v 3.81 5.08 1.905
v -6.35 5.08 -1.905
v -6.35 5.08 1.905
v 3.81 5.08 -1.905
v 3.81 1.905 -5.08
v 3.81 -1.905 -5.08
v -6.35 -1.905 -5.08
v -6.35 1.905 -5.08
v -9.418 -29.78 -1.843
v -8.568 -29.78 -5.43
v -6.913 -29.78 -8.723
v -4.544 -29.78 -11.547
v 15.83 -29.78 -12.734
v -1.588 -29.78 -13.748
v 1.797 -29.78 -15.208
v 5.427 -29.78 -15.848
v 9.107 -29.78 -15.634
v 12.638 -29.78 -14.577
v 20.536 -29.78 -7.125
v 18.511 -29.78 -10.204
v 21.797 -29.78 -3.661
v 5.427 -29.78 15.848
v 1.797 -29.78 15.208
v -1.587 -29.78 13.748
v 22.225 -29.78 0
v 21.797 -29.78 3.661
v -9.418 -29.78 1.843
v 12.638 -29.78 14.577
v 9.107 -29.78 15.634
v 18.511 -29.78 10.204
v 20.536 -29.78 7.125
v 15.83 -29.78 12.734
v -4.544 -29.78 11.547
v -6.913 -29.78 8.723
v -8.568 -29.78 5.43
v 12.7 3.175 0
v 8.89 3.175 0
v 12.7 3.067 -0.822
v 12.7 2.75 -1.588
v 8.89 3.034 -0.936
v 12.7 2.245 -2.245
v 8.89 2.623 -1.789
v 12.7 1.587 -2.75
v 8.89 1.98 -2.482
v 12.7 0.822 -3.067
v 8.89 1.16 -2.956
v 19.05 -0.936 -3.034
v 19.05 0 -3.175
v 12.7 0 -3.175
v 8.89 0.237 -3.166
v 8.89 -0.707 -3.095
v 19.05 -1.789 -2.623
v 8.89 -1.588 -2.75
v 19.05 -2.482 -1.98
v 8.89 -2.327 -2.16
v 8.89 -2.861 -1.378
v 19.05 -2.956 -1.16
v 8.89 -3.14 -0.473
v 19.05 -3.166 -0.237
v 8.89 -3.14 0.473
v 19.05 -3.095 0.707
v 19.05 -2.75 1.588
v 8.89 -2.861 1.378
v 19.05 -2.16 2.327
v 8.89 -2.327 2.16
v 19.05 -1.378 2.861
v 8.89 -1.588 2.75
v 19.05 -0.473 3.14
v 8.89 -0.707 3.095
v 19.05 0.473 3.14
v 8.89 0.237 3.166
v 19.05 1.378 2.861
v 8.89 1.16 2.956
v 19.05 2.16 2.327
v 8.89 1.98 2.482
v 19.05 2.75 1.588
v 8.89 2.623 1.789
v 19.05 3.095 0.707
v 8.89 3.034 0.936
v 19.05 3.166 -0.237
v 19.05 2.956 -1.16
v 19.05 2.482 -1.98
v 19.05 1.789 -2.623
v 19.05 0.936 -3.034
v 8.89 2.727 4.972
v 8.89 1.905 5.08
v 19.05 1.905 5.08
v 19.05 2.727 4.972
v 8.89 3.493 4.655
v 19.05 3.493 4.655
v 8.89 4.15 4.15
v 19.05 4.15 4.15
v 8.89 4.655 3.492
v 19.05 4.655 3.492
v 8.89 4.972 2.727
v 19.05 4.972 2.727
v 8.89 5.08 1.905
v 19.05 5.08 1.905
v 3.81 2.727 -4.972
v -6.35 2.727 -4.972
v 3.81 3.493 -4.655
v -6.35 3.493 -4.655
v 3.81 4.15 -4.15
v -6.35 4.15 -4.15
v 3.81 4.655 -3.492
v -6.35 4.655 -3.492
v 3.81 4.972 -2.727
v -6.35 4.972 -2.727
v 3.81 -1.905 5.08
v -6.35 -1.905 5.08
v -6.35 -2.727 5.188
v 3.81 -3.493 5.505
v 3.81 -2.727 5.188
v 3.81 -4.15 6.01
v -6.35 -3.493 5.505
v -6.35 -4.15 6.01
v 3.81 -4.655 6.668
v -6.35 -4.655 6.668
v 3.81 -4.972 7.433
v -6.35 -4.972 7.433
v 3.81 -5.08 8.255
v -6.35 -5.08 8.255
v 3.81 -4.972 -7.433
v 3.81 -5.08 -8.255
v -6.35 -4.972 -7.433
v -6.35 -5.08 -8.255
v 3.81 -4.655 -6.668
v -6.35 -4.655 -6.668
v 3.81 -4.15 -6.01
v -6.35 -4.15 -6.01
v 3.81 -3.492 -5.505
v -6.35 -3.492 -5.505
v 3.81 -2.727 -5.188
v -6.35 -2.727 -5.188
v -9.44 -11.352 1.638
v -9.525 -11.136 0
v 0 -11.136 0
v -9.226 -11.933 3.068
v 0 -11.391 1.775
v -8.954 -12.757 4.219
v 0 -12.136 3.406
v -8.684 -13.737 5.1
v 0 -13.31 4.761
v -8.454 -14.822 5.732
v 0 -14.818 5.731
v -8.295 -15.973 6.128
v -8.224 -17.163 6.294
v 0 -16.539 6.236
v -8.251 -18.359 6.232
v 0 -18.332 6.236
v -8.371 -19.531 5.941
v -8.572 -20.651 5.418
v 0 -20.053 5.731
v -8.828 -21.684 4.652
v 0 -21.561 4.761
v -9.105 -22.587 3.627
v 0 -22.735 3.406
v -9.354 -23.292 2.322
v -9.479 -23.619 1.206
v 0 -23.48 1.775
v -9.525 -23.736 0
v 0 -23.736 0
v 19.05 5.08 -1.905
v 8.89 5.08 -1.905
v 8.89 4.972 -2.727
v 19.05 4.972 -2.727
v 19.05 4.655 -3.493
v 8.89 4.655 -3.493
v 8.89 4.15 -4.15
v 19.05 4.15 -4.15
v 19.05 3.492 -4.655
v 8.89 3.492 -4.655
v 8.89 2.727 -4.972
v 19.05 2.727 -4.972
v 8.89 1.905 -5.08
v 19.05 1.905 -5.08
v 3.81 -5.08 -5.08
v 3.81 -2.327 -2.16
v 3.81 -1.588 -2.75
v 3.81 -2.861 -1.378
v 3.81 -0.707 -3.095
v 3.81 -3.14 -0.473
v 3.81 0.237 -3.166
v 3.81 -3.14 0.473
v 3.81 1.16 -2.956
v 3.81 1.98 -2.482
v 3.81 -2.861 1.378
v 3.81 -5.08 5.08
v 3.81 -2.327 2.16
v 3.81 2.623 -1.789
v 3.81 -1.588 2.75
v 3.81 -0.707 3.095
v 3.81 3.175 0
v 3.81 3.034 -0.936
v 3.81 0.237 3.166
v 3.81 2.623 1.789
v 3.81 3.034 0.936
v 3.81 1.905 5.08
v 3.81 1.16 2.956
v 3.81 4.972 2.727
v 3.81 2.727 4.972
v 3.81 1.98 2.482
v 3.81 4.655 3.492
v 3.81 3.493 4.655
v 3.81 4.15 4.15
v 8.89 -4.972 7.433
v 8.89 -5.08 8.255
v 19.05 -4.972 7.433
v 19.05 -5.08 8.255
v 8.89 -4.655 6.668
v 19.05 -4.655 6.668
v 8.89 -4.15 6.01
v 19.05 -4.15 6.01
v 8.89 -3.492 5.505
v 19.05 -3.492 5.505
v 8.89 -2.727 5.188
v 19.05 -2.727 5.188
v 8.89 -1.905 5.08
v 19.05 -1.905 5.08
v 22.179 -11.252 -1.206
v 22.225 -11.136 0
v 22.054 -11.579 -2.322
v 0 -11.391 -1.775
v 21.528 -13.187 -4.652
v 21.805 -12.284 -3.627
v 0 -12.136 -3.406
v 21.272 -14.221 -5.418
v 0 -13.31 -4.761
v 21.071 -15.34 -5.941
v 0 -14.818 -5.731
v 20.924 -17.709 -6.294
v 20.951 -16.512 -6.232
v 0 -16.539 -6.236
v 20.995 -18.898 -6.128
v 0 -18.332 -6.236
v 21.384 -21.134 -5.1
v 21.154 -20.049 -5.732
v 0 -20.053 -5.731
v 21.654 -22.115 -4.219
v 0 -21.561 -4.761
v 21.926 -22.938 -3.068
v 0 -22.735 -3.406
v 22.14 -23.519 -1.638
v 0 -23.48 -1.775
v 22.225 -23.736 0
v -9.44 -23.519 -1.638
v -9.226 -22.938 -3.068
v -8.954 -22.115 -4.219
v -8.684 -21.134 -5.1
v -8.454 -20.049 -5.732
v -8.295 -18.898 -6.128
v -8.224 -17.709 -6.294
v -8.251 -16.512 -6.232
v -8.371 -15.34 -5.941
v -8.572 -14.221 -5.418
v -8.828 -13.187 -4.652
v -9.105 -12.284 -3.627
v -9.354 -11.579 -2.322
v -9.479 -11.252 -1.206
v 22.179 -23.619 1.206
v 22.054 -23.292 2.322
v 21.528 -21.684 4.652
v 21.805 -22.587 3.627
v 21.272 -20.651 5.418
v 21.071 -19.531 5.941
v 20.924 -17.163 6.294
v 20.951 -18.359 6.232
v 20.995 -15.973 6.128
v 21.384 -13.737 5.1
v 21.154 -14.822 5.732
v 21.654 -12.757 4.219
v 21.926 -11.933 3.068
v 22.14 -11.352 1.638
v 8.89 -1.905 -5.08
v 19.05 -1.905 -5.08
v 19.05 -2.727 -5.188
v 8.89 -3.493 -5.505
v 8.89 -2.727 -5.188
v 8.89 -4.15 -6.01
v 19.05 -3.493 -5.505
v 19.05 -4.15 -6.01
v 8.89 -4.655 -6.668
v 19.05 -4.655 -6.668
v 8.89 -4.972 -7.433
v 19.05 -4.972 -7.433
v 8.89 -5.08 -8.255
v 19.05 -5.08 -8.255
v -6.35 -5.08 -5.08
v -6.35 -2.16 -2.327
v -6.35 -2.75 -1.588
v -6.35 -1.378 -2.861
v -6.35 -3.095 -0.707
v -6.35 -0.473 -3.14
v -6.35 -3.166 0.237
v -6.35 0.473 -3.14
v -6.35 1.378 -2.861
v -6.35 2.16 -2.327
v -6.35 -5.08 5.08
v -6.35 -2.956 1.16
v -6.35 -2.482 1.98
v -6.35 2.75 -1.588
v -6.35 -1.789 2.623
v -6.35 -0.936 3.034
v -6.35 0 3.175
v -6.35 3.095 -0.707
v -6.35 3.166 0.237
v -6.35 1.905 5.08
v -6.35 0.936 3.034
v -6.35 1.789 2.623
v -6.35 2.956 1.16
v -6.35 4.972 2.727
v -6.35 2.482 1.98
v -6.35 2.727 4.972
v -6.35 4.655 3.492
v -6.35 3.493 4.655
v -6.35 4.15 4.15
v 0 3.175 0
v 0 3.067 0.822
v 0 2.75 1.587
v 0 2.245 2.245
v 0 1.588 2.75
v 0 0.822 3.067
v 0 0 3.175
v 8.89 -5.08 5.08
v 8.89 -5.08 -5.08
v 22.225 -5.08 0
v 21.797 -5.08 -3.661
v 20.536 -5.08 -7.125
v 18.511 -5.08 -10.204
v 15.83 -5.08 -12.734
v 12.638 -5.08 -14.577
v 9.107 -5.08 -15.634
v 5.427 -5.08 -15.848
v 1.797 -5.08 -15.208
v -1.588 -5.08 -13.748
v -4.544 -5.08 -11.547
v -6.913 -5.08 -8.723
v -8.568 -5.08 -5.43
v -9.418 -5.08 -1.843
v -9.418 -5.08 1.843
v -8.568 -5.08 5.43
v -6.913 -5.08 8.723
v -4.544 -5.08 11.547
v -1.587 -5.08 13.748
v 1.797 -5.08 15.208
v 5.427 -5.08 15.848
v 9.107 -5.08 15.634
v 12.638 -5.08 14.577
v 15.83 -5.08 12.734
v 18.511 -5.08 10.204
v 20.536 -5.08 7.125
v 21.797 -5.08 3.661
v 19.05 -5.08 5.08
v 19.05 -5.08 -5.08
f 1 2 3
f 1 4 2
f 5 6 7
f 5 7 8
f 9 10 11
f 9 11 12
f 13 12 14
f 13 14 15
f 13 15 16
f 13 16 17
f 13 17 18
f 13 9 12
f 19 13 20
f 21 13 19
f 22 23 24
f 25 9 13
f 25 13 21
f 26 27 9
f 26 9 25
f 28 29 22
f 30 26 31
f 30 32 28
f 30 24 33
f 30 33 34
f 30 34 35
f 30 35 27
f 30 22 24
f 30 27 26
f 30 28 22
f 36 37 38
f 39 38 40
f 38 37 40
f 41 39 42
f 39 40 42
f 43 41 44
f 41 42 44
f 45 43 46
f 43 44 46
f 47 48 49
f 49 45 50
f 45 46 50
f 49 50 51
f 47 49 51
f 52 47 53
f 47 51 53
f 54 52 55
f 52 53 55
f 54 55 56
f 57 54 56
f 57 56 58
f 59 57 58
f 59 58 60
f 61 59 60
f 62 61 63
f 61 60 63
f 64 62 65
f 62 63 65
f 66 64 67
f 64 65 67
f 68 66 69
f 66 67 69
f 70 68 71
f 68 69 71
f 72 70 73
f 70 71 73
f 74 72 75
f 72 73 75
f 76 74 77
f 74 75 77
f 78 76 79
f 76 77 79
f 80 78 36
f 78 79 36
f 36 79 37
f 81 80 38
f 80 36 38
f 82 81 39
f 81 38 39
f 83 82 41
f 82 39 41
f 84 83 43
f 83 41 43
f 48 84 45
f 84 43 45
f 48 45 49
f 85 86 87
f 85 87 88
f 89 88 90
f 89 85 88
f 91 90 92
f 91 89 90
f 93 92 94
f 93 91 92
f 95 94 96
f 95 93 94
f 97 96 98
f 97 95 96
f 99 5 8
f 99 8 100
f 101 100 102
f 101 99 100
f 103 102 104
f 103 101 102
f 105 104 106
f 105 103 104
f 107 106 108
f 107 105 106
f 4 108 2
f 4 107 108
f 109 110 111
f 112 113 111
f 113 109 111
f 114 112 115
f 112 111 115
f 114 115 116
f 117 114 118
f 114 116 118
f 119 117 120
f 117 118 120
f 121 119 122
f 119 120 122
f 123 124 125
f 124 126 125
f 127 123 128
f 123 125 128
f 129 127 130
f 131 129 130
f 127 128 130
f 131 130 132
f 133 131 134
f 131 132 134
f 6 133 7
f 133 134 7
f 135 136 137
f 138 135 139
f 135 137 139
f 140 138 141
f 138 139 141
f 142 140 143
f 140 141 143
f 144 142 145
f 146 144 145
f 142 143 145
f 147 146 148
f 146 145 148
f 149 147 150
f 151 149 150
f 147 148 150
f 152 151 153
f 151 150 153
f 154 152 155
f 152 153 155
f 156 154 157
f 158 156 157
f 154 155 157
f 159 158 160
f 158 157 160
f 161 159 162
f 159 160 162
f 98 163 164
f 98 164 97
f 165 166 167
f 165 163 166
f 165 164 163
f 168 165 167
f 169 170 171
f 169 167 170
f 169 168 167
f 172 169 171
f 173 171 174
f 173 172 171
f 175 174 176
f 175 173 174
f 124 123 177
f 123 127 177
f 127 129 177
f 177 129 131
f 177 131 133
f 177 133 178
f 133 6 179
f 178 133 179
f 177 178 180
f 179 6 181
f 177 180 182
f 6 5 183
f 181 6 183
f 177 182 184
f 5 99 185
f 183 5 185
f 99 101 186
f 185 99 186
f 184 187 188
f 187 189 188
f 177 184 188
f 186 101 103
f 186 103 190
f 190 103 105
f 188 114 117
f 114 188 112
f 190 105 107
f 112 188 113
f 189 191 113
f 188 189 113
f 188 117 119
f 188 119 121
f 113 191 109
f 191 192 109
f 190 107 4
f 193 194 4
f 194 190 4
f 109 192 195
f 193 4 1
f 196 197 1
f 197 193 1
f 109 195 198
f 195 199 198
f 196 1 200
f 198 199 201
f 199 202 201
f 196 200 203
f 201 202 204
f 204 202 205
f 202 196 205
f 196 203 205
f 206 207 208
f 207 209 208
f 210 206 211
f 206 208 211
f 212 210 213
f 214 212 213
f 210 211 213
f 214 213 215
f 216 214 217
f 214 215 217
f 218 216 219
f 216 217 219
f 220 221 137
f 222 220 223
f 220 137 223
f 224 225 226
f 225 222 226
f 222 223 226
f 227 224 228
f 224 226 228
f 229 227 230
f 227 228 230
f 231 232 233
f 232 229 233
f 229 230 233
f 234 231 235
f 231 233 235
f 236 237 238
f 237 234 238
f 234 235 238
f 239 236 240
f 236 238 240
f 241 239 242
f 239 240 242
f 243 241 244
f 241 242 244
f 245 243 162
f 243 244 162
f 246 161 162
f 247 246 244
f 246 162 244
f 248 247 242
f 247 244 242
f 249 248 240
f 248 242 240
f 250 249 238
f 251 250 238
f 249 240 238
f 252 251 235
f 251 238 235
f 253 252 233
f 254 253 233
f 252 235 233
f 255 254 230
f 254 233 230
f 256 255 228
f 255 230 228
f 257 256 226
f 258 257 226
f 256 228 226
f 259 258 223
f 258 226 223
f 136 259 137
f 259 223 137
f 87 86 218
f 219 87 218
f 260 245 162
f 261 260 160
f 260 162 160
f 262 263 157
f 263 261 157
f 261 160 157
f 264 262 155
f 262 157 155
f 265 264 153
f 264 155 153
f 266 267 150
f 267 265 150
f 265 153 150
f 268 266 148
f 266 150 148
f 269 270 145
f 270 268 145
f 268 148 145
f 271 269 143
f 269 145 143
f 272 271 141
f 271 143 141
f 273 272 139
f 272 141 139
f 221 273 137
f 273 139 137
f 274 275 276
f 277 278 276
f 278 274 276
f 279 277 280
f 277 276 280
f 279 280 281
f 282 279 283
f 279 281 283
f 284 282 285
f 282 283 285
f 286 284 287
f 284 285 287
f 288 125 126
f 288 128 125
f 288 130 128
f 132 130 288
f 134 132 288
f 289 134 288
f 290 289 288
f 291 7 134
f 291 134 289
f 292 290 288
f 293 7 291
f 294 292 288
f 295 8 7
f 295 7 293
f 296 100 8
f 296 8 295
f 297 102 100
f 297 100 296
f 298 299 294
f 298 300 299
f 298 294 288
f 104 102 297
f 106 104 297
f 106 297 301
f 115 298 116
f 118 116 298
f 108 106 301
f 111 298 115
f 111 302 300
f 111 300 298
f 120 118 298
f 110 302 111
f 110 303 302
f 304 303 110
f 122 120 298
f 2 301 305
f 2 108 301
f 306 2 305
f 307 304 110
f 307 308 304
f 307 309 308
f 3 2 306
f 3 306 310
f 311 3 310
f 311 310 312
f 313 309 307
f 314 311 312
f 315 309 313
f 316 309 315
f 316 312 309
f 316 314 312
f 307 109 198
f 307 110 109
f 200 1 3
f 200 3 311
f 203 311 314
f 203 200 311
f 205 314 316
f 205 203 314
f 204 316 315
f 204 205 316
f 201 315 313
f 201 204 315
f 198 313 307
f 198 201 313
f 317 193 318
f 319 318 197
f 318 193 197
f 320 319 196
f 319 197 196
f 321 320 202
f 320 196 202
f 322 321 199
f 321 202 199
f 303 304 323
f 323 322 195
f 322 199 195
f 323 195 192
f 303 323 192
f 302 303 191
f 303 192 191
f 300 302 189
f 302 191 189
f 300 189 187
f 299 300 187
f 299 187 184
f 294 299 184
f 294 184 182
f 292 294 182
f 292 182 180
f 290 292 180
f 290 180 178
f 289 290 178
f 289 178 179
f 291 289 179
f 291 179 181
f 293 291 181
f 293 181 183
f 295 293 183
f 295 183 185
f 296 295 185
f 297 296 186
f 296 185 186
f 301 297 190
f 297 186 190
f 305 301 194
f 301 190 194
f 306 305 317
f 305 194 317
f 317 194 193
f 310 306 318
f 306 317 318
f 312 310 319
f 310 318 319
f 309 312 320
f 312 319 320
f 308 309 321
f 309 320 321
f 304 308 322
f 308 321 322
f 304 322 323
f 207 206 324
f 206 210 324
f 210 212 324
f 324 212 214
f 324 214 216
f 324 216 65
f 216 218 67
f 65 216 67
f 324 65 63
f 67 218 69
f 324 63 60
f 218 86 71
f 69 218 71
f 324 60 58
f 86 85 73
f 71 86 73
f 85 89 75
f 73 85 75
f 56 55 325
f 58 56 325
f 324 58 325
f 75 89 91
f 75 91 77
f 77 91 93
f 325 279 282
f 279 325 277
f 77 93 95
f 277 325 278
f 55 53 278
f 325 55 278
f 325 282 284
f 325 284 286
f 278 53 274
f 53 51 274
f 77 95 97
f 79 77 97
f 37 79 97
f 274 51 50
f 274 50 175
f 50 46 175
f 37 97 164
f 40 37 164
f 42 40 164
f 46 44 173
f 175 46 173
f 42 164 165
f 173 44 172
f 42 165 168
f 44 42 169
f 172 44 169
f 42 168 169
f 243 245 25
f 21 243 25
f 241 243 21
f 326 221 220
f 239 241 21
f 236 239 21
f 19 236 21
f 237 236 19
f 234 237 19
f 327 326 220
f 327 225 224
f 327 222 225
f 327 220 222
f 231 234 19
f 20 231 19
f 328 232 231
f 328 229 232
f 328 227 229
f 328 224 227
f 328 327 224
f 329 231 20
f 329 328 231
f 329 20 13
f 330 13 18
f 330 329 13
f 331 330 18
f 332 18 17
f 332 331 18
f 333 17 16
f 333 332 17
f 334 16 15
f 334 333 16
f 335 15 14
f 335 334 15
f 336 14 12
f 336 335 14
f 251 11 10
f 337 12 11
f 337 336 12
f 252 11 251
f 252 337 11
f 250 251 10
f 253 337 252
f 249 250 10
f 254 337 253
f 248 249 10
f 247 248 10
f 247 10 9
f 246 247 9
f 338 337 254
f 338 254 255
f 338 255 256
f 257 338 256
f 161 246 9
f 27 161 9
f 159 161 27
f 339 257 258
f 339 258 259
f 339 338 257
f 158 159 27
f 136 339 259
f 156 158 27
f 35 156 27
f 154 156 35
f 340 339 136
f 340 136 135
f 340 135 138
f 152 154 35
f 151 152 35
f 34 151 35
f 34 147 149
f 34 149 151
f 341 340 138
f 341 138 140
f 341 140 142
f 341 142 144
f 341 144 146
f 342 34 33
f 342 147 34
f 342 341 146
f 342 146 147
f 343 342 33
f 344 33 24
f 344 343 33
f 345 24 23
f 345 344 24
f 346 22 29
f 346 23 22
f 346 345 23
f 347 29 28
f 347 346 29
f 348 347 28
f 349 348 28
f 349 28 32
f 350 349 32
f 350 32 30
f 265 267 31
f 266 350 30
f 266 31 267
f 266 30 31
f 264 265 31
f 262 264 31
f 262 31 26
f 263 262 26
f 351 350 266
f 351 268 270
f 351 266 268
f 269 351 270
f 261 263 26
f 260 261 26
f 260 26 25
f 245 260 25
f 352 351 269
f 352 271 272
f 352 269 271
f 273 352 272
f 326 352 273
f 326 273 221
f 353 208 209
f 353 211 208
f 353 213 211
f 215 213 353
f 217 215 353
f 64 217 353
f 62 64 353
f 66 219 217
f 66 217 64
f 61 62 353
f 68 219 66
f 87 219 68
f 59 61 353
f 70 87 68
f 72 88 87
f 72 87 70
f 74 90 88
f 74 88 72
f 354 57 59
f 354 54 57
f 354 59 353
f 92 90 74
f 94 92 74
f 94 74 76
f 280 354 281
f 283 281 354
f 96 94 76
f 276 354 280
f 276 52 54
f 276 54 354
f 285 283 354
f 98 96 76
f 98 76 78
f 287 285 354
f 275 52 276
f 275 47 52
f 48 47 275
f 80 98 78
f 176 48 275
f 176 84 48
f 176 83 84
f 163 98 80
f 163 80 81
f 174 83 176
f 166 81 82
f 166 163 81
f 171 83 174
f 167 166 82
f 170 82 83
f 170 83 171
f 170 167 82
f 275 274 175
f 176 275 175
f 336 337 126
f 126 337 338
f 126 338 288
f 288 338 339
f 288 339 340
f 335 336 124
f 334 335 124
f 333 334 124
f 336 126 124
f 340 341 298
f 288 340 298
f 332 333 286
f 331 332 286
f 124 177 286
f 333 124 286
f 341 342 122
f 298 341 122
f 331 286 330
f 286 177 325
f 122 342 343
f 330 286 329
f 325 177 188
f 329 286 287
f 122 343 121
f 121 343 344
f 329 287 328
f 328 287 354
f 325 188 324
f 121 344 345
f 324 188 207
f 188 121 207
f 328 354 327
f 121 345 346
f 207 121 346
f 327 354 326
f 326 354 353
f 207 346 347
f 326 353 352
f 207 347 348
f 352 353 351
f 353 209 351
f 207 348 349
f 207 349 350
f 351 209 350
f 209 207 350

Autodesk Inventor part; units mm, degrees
ref_plane "YZ Plane" through (0, 0, 0) normal (1, 0, 0) x (0, 1, 0)
ref_plane "XZ Plane" through (0, 0, 0) normal (0, 1, 0) x (-1, 0, 0)
ref_plane "XY Plane" through (0, 0, 0) normal (0, 0, 1) x (1, 0, 0)
sketch "Sketch1" plane through (0, 0, 0) normal (1, 0, 0) x (0, 1, 0)
  circle A0 centre (0, 0) radius 3.175
  line L0 (-5.08, 5.08) -> (5.08, 5.08)
  line L1 (5.08, 5.08) -> (5.08, -5.08)
  line L2 (5.08, -5.08) -> (-5.08, -5.08)
  line L3 (-5.08, -5.08) -> (-5.08, 5.08)
  line L4 (-5.08, 5.08) -> (5.08, -5.08) construction
  line L5 (5.08, 5.08) -> (-5.08, -5.08) construction
  dimension "d0" = 6.35
  dimension "d1" = 10.16
  dimension "d2" = 10.16
extrude "Extrusion1" add sketch "Sketch1" along normal blind 12.7
sketch "Sketch2" plane through (0, -5.08, -5.08) normal (0, -1, 0) x (1, 0, 0)
  line L0 (-19.05, 30.48) -> (31.75, 30.48)
  line L1 (31.75, 30.48) -> (31.75, -20.32)
  line L2 (31.75, -20.32) -> (-19.05, -20.32)
  line L3 (-19.05, -20.32) -> (-19.05, 30.48)
  line L4 (-19.05, 30.48) -> (31.75, -20.32) construction
  line L5 (31.75, 30.48) -> (-19.05, -20.32) construction
  circle A0 centre (6.35, 5.08) radius 15.875
  point P0 (0, 5.08)
  dimension "d7" = 50.8
  dimension "d8" = 50.8
  dimension "d9" = 31.75
extrude "Extrusion2" add sketch "Sketch2" along normal blind 6.35 contours A0
sketch "Sketch3" plane through (0, 5.08, 5.08) normal (0, 1, 0) x (1, 0, 0)
  line L0 (8.89, 17.78) -> (3.81, 17.78)
  line L1 (3.81, 17.78) -> (3.81, -7.62)
  line L2 (3.81, -7.62) -> (8.89, -7.62)
  line L3 (8.89, -7.62) -> (8.89, 17.78)
  line L4 (8.89, 17.78) -> (3.81, -7.62) construction
  line L5 (3.81, 17.78) -> (8.89, -7.62) construction
  line L6 (12.7, 10.16) -> (12.7, 0) projected
  point P0 (0, 5.08)
  point P1 (6.35, 5.08)
  dimension "d12" = 5.08
  dimension "d13" = 25.4
  dimension "d42" = 6.35
extrude "Extrusion3" cut sketch "Sketch3" against normal up to surface (10.16 mm away)
sketch "Sketch5" plane through (12.7, 0, 0) normal (1, 0, 0) x (0, 0, -1)
  line L0 (5.08, -5.08) -> (5.08, 5.08) projected
  line L1 (5.08, 5.08) -> (-5.08, 5.08) projected
  line L2 (-5.08, 5.08) -> (-5.08, -5.08) projected
  line L3 (-5.08, -5.08) -> (5.08, -5.08) projected
  circle A0 centre (0, 0) radius 3.175 projected
extrude "Extrusion4" add sketch "Sketch5" along normal blind 6.35
sketch "Sketch6" plane through (0, 0, 0) normal (-1, 0, 0) x (0, 0, 1)
  line L0 (-5.08, -5.08) -> (-5.08, 5.08) projected
  line L1 (5.08, -5.08) -> (-5.08, -5.08) projected
  line L2 (5.08, 5.08) -> (5.08, -5.08) projected
  line L3 (-5.08, 5.08) -> (5.08, 5.08) projected
  circle A0 centre (0, 0) radius 3.175 projected
extrude "Extrusion5" add sketch "Sketch6" along normal blind 6.35
fillet "Fillet3" radius 3.175 4 edges at (-1.27, 5.08, -5.08) (13.97, 5.08, -5.08) (-1.27, 5.08, 5.08) (13.97, 5.08, 5.08)
sketch "Sketch10" plane through (6.35, -11.43, 0) normal (0, -1, 0) x (1, 0, 0)
  circle A0 centre (0, 0) radius 15.875 projected
  point P0 (-6.35, 0)
extrude "Extrusion9" add sketch "Sketch10" along normal blind 18.35
sketch "Sketch11" plane through (0, 0, 0) normal (1, 0, 0) x (0, 1, 0)
  line L0 (-29.78, 15.875) -> (-29.78, -15.875) projected
  line L1 (-29.78, 0) -> (-17.4356, 0)
  circle A0 centre (-17.4356, 0) radius 6.3
  point P0 (0, 0)
  dimension "d37" = 12.3444
  dimension "d38" = 12.6
extrude "Extrusion10" cut sketch "Sketch11" along normal mid plane 127
fillet "Fillet9" radius 3.175 4 edges at (13.97, -5.08, -5.08) (-1.27, -5.08, -5.08) (-1.27, -5.08, 5.08) (13.97, -5.08, 5.08)
properties part number "TubeMount"
